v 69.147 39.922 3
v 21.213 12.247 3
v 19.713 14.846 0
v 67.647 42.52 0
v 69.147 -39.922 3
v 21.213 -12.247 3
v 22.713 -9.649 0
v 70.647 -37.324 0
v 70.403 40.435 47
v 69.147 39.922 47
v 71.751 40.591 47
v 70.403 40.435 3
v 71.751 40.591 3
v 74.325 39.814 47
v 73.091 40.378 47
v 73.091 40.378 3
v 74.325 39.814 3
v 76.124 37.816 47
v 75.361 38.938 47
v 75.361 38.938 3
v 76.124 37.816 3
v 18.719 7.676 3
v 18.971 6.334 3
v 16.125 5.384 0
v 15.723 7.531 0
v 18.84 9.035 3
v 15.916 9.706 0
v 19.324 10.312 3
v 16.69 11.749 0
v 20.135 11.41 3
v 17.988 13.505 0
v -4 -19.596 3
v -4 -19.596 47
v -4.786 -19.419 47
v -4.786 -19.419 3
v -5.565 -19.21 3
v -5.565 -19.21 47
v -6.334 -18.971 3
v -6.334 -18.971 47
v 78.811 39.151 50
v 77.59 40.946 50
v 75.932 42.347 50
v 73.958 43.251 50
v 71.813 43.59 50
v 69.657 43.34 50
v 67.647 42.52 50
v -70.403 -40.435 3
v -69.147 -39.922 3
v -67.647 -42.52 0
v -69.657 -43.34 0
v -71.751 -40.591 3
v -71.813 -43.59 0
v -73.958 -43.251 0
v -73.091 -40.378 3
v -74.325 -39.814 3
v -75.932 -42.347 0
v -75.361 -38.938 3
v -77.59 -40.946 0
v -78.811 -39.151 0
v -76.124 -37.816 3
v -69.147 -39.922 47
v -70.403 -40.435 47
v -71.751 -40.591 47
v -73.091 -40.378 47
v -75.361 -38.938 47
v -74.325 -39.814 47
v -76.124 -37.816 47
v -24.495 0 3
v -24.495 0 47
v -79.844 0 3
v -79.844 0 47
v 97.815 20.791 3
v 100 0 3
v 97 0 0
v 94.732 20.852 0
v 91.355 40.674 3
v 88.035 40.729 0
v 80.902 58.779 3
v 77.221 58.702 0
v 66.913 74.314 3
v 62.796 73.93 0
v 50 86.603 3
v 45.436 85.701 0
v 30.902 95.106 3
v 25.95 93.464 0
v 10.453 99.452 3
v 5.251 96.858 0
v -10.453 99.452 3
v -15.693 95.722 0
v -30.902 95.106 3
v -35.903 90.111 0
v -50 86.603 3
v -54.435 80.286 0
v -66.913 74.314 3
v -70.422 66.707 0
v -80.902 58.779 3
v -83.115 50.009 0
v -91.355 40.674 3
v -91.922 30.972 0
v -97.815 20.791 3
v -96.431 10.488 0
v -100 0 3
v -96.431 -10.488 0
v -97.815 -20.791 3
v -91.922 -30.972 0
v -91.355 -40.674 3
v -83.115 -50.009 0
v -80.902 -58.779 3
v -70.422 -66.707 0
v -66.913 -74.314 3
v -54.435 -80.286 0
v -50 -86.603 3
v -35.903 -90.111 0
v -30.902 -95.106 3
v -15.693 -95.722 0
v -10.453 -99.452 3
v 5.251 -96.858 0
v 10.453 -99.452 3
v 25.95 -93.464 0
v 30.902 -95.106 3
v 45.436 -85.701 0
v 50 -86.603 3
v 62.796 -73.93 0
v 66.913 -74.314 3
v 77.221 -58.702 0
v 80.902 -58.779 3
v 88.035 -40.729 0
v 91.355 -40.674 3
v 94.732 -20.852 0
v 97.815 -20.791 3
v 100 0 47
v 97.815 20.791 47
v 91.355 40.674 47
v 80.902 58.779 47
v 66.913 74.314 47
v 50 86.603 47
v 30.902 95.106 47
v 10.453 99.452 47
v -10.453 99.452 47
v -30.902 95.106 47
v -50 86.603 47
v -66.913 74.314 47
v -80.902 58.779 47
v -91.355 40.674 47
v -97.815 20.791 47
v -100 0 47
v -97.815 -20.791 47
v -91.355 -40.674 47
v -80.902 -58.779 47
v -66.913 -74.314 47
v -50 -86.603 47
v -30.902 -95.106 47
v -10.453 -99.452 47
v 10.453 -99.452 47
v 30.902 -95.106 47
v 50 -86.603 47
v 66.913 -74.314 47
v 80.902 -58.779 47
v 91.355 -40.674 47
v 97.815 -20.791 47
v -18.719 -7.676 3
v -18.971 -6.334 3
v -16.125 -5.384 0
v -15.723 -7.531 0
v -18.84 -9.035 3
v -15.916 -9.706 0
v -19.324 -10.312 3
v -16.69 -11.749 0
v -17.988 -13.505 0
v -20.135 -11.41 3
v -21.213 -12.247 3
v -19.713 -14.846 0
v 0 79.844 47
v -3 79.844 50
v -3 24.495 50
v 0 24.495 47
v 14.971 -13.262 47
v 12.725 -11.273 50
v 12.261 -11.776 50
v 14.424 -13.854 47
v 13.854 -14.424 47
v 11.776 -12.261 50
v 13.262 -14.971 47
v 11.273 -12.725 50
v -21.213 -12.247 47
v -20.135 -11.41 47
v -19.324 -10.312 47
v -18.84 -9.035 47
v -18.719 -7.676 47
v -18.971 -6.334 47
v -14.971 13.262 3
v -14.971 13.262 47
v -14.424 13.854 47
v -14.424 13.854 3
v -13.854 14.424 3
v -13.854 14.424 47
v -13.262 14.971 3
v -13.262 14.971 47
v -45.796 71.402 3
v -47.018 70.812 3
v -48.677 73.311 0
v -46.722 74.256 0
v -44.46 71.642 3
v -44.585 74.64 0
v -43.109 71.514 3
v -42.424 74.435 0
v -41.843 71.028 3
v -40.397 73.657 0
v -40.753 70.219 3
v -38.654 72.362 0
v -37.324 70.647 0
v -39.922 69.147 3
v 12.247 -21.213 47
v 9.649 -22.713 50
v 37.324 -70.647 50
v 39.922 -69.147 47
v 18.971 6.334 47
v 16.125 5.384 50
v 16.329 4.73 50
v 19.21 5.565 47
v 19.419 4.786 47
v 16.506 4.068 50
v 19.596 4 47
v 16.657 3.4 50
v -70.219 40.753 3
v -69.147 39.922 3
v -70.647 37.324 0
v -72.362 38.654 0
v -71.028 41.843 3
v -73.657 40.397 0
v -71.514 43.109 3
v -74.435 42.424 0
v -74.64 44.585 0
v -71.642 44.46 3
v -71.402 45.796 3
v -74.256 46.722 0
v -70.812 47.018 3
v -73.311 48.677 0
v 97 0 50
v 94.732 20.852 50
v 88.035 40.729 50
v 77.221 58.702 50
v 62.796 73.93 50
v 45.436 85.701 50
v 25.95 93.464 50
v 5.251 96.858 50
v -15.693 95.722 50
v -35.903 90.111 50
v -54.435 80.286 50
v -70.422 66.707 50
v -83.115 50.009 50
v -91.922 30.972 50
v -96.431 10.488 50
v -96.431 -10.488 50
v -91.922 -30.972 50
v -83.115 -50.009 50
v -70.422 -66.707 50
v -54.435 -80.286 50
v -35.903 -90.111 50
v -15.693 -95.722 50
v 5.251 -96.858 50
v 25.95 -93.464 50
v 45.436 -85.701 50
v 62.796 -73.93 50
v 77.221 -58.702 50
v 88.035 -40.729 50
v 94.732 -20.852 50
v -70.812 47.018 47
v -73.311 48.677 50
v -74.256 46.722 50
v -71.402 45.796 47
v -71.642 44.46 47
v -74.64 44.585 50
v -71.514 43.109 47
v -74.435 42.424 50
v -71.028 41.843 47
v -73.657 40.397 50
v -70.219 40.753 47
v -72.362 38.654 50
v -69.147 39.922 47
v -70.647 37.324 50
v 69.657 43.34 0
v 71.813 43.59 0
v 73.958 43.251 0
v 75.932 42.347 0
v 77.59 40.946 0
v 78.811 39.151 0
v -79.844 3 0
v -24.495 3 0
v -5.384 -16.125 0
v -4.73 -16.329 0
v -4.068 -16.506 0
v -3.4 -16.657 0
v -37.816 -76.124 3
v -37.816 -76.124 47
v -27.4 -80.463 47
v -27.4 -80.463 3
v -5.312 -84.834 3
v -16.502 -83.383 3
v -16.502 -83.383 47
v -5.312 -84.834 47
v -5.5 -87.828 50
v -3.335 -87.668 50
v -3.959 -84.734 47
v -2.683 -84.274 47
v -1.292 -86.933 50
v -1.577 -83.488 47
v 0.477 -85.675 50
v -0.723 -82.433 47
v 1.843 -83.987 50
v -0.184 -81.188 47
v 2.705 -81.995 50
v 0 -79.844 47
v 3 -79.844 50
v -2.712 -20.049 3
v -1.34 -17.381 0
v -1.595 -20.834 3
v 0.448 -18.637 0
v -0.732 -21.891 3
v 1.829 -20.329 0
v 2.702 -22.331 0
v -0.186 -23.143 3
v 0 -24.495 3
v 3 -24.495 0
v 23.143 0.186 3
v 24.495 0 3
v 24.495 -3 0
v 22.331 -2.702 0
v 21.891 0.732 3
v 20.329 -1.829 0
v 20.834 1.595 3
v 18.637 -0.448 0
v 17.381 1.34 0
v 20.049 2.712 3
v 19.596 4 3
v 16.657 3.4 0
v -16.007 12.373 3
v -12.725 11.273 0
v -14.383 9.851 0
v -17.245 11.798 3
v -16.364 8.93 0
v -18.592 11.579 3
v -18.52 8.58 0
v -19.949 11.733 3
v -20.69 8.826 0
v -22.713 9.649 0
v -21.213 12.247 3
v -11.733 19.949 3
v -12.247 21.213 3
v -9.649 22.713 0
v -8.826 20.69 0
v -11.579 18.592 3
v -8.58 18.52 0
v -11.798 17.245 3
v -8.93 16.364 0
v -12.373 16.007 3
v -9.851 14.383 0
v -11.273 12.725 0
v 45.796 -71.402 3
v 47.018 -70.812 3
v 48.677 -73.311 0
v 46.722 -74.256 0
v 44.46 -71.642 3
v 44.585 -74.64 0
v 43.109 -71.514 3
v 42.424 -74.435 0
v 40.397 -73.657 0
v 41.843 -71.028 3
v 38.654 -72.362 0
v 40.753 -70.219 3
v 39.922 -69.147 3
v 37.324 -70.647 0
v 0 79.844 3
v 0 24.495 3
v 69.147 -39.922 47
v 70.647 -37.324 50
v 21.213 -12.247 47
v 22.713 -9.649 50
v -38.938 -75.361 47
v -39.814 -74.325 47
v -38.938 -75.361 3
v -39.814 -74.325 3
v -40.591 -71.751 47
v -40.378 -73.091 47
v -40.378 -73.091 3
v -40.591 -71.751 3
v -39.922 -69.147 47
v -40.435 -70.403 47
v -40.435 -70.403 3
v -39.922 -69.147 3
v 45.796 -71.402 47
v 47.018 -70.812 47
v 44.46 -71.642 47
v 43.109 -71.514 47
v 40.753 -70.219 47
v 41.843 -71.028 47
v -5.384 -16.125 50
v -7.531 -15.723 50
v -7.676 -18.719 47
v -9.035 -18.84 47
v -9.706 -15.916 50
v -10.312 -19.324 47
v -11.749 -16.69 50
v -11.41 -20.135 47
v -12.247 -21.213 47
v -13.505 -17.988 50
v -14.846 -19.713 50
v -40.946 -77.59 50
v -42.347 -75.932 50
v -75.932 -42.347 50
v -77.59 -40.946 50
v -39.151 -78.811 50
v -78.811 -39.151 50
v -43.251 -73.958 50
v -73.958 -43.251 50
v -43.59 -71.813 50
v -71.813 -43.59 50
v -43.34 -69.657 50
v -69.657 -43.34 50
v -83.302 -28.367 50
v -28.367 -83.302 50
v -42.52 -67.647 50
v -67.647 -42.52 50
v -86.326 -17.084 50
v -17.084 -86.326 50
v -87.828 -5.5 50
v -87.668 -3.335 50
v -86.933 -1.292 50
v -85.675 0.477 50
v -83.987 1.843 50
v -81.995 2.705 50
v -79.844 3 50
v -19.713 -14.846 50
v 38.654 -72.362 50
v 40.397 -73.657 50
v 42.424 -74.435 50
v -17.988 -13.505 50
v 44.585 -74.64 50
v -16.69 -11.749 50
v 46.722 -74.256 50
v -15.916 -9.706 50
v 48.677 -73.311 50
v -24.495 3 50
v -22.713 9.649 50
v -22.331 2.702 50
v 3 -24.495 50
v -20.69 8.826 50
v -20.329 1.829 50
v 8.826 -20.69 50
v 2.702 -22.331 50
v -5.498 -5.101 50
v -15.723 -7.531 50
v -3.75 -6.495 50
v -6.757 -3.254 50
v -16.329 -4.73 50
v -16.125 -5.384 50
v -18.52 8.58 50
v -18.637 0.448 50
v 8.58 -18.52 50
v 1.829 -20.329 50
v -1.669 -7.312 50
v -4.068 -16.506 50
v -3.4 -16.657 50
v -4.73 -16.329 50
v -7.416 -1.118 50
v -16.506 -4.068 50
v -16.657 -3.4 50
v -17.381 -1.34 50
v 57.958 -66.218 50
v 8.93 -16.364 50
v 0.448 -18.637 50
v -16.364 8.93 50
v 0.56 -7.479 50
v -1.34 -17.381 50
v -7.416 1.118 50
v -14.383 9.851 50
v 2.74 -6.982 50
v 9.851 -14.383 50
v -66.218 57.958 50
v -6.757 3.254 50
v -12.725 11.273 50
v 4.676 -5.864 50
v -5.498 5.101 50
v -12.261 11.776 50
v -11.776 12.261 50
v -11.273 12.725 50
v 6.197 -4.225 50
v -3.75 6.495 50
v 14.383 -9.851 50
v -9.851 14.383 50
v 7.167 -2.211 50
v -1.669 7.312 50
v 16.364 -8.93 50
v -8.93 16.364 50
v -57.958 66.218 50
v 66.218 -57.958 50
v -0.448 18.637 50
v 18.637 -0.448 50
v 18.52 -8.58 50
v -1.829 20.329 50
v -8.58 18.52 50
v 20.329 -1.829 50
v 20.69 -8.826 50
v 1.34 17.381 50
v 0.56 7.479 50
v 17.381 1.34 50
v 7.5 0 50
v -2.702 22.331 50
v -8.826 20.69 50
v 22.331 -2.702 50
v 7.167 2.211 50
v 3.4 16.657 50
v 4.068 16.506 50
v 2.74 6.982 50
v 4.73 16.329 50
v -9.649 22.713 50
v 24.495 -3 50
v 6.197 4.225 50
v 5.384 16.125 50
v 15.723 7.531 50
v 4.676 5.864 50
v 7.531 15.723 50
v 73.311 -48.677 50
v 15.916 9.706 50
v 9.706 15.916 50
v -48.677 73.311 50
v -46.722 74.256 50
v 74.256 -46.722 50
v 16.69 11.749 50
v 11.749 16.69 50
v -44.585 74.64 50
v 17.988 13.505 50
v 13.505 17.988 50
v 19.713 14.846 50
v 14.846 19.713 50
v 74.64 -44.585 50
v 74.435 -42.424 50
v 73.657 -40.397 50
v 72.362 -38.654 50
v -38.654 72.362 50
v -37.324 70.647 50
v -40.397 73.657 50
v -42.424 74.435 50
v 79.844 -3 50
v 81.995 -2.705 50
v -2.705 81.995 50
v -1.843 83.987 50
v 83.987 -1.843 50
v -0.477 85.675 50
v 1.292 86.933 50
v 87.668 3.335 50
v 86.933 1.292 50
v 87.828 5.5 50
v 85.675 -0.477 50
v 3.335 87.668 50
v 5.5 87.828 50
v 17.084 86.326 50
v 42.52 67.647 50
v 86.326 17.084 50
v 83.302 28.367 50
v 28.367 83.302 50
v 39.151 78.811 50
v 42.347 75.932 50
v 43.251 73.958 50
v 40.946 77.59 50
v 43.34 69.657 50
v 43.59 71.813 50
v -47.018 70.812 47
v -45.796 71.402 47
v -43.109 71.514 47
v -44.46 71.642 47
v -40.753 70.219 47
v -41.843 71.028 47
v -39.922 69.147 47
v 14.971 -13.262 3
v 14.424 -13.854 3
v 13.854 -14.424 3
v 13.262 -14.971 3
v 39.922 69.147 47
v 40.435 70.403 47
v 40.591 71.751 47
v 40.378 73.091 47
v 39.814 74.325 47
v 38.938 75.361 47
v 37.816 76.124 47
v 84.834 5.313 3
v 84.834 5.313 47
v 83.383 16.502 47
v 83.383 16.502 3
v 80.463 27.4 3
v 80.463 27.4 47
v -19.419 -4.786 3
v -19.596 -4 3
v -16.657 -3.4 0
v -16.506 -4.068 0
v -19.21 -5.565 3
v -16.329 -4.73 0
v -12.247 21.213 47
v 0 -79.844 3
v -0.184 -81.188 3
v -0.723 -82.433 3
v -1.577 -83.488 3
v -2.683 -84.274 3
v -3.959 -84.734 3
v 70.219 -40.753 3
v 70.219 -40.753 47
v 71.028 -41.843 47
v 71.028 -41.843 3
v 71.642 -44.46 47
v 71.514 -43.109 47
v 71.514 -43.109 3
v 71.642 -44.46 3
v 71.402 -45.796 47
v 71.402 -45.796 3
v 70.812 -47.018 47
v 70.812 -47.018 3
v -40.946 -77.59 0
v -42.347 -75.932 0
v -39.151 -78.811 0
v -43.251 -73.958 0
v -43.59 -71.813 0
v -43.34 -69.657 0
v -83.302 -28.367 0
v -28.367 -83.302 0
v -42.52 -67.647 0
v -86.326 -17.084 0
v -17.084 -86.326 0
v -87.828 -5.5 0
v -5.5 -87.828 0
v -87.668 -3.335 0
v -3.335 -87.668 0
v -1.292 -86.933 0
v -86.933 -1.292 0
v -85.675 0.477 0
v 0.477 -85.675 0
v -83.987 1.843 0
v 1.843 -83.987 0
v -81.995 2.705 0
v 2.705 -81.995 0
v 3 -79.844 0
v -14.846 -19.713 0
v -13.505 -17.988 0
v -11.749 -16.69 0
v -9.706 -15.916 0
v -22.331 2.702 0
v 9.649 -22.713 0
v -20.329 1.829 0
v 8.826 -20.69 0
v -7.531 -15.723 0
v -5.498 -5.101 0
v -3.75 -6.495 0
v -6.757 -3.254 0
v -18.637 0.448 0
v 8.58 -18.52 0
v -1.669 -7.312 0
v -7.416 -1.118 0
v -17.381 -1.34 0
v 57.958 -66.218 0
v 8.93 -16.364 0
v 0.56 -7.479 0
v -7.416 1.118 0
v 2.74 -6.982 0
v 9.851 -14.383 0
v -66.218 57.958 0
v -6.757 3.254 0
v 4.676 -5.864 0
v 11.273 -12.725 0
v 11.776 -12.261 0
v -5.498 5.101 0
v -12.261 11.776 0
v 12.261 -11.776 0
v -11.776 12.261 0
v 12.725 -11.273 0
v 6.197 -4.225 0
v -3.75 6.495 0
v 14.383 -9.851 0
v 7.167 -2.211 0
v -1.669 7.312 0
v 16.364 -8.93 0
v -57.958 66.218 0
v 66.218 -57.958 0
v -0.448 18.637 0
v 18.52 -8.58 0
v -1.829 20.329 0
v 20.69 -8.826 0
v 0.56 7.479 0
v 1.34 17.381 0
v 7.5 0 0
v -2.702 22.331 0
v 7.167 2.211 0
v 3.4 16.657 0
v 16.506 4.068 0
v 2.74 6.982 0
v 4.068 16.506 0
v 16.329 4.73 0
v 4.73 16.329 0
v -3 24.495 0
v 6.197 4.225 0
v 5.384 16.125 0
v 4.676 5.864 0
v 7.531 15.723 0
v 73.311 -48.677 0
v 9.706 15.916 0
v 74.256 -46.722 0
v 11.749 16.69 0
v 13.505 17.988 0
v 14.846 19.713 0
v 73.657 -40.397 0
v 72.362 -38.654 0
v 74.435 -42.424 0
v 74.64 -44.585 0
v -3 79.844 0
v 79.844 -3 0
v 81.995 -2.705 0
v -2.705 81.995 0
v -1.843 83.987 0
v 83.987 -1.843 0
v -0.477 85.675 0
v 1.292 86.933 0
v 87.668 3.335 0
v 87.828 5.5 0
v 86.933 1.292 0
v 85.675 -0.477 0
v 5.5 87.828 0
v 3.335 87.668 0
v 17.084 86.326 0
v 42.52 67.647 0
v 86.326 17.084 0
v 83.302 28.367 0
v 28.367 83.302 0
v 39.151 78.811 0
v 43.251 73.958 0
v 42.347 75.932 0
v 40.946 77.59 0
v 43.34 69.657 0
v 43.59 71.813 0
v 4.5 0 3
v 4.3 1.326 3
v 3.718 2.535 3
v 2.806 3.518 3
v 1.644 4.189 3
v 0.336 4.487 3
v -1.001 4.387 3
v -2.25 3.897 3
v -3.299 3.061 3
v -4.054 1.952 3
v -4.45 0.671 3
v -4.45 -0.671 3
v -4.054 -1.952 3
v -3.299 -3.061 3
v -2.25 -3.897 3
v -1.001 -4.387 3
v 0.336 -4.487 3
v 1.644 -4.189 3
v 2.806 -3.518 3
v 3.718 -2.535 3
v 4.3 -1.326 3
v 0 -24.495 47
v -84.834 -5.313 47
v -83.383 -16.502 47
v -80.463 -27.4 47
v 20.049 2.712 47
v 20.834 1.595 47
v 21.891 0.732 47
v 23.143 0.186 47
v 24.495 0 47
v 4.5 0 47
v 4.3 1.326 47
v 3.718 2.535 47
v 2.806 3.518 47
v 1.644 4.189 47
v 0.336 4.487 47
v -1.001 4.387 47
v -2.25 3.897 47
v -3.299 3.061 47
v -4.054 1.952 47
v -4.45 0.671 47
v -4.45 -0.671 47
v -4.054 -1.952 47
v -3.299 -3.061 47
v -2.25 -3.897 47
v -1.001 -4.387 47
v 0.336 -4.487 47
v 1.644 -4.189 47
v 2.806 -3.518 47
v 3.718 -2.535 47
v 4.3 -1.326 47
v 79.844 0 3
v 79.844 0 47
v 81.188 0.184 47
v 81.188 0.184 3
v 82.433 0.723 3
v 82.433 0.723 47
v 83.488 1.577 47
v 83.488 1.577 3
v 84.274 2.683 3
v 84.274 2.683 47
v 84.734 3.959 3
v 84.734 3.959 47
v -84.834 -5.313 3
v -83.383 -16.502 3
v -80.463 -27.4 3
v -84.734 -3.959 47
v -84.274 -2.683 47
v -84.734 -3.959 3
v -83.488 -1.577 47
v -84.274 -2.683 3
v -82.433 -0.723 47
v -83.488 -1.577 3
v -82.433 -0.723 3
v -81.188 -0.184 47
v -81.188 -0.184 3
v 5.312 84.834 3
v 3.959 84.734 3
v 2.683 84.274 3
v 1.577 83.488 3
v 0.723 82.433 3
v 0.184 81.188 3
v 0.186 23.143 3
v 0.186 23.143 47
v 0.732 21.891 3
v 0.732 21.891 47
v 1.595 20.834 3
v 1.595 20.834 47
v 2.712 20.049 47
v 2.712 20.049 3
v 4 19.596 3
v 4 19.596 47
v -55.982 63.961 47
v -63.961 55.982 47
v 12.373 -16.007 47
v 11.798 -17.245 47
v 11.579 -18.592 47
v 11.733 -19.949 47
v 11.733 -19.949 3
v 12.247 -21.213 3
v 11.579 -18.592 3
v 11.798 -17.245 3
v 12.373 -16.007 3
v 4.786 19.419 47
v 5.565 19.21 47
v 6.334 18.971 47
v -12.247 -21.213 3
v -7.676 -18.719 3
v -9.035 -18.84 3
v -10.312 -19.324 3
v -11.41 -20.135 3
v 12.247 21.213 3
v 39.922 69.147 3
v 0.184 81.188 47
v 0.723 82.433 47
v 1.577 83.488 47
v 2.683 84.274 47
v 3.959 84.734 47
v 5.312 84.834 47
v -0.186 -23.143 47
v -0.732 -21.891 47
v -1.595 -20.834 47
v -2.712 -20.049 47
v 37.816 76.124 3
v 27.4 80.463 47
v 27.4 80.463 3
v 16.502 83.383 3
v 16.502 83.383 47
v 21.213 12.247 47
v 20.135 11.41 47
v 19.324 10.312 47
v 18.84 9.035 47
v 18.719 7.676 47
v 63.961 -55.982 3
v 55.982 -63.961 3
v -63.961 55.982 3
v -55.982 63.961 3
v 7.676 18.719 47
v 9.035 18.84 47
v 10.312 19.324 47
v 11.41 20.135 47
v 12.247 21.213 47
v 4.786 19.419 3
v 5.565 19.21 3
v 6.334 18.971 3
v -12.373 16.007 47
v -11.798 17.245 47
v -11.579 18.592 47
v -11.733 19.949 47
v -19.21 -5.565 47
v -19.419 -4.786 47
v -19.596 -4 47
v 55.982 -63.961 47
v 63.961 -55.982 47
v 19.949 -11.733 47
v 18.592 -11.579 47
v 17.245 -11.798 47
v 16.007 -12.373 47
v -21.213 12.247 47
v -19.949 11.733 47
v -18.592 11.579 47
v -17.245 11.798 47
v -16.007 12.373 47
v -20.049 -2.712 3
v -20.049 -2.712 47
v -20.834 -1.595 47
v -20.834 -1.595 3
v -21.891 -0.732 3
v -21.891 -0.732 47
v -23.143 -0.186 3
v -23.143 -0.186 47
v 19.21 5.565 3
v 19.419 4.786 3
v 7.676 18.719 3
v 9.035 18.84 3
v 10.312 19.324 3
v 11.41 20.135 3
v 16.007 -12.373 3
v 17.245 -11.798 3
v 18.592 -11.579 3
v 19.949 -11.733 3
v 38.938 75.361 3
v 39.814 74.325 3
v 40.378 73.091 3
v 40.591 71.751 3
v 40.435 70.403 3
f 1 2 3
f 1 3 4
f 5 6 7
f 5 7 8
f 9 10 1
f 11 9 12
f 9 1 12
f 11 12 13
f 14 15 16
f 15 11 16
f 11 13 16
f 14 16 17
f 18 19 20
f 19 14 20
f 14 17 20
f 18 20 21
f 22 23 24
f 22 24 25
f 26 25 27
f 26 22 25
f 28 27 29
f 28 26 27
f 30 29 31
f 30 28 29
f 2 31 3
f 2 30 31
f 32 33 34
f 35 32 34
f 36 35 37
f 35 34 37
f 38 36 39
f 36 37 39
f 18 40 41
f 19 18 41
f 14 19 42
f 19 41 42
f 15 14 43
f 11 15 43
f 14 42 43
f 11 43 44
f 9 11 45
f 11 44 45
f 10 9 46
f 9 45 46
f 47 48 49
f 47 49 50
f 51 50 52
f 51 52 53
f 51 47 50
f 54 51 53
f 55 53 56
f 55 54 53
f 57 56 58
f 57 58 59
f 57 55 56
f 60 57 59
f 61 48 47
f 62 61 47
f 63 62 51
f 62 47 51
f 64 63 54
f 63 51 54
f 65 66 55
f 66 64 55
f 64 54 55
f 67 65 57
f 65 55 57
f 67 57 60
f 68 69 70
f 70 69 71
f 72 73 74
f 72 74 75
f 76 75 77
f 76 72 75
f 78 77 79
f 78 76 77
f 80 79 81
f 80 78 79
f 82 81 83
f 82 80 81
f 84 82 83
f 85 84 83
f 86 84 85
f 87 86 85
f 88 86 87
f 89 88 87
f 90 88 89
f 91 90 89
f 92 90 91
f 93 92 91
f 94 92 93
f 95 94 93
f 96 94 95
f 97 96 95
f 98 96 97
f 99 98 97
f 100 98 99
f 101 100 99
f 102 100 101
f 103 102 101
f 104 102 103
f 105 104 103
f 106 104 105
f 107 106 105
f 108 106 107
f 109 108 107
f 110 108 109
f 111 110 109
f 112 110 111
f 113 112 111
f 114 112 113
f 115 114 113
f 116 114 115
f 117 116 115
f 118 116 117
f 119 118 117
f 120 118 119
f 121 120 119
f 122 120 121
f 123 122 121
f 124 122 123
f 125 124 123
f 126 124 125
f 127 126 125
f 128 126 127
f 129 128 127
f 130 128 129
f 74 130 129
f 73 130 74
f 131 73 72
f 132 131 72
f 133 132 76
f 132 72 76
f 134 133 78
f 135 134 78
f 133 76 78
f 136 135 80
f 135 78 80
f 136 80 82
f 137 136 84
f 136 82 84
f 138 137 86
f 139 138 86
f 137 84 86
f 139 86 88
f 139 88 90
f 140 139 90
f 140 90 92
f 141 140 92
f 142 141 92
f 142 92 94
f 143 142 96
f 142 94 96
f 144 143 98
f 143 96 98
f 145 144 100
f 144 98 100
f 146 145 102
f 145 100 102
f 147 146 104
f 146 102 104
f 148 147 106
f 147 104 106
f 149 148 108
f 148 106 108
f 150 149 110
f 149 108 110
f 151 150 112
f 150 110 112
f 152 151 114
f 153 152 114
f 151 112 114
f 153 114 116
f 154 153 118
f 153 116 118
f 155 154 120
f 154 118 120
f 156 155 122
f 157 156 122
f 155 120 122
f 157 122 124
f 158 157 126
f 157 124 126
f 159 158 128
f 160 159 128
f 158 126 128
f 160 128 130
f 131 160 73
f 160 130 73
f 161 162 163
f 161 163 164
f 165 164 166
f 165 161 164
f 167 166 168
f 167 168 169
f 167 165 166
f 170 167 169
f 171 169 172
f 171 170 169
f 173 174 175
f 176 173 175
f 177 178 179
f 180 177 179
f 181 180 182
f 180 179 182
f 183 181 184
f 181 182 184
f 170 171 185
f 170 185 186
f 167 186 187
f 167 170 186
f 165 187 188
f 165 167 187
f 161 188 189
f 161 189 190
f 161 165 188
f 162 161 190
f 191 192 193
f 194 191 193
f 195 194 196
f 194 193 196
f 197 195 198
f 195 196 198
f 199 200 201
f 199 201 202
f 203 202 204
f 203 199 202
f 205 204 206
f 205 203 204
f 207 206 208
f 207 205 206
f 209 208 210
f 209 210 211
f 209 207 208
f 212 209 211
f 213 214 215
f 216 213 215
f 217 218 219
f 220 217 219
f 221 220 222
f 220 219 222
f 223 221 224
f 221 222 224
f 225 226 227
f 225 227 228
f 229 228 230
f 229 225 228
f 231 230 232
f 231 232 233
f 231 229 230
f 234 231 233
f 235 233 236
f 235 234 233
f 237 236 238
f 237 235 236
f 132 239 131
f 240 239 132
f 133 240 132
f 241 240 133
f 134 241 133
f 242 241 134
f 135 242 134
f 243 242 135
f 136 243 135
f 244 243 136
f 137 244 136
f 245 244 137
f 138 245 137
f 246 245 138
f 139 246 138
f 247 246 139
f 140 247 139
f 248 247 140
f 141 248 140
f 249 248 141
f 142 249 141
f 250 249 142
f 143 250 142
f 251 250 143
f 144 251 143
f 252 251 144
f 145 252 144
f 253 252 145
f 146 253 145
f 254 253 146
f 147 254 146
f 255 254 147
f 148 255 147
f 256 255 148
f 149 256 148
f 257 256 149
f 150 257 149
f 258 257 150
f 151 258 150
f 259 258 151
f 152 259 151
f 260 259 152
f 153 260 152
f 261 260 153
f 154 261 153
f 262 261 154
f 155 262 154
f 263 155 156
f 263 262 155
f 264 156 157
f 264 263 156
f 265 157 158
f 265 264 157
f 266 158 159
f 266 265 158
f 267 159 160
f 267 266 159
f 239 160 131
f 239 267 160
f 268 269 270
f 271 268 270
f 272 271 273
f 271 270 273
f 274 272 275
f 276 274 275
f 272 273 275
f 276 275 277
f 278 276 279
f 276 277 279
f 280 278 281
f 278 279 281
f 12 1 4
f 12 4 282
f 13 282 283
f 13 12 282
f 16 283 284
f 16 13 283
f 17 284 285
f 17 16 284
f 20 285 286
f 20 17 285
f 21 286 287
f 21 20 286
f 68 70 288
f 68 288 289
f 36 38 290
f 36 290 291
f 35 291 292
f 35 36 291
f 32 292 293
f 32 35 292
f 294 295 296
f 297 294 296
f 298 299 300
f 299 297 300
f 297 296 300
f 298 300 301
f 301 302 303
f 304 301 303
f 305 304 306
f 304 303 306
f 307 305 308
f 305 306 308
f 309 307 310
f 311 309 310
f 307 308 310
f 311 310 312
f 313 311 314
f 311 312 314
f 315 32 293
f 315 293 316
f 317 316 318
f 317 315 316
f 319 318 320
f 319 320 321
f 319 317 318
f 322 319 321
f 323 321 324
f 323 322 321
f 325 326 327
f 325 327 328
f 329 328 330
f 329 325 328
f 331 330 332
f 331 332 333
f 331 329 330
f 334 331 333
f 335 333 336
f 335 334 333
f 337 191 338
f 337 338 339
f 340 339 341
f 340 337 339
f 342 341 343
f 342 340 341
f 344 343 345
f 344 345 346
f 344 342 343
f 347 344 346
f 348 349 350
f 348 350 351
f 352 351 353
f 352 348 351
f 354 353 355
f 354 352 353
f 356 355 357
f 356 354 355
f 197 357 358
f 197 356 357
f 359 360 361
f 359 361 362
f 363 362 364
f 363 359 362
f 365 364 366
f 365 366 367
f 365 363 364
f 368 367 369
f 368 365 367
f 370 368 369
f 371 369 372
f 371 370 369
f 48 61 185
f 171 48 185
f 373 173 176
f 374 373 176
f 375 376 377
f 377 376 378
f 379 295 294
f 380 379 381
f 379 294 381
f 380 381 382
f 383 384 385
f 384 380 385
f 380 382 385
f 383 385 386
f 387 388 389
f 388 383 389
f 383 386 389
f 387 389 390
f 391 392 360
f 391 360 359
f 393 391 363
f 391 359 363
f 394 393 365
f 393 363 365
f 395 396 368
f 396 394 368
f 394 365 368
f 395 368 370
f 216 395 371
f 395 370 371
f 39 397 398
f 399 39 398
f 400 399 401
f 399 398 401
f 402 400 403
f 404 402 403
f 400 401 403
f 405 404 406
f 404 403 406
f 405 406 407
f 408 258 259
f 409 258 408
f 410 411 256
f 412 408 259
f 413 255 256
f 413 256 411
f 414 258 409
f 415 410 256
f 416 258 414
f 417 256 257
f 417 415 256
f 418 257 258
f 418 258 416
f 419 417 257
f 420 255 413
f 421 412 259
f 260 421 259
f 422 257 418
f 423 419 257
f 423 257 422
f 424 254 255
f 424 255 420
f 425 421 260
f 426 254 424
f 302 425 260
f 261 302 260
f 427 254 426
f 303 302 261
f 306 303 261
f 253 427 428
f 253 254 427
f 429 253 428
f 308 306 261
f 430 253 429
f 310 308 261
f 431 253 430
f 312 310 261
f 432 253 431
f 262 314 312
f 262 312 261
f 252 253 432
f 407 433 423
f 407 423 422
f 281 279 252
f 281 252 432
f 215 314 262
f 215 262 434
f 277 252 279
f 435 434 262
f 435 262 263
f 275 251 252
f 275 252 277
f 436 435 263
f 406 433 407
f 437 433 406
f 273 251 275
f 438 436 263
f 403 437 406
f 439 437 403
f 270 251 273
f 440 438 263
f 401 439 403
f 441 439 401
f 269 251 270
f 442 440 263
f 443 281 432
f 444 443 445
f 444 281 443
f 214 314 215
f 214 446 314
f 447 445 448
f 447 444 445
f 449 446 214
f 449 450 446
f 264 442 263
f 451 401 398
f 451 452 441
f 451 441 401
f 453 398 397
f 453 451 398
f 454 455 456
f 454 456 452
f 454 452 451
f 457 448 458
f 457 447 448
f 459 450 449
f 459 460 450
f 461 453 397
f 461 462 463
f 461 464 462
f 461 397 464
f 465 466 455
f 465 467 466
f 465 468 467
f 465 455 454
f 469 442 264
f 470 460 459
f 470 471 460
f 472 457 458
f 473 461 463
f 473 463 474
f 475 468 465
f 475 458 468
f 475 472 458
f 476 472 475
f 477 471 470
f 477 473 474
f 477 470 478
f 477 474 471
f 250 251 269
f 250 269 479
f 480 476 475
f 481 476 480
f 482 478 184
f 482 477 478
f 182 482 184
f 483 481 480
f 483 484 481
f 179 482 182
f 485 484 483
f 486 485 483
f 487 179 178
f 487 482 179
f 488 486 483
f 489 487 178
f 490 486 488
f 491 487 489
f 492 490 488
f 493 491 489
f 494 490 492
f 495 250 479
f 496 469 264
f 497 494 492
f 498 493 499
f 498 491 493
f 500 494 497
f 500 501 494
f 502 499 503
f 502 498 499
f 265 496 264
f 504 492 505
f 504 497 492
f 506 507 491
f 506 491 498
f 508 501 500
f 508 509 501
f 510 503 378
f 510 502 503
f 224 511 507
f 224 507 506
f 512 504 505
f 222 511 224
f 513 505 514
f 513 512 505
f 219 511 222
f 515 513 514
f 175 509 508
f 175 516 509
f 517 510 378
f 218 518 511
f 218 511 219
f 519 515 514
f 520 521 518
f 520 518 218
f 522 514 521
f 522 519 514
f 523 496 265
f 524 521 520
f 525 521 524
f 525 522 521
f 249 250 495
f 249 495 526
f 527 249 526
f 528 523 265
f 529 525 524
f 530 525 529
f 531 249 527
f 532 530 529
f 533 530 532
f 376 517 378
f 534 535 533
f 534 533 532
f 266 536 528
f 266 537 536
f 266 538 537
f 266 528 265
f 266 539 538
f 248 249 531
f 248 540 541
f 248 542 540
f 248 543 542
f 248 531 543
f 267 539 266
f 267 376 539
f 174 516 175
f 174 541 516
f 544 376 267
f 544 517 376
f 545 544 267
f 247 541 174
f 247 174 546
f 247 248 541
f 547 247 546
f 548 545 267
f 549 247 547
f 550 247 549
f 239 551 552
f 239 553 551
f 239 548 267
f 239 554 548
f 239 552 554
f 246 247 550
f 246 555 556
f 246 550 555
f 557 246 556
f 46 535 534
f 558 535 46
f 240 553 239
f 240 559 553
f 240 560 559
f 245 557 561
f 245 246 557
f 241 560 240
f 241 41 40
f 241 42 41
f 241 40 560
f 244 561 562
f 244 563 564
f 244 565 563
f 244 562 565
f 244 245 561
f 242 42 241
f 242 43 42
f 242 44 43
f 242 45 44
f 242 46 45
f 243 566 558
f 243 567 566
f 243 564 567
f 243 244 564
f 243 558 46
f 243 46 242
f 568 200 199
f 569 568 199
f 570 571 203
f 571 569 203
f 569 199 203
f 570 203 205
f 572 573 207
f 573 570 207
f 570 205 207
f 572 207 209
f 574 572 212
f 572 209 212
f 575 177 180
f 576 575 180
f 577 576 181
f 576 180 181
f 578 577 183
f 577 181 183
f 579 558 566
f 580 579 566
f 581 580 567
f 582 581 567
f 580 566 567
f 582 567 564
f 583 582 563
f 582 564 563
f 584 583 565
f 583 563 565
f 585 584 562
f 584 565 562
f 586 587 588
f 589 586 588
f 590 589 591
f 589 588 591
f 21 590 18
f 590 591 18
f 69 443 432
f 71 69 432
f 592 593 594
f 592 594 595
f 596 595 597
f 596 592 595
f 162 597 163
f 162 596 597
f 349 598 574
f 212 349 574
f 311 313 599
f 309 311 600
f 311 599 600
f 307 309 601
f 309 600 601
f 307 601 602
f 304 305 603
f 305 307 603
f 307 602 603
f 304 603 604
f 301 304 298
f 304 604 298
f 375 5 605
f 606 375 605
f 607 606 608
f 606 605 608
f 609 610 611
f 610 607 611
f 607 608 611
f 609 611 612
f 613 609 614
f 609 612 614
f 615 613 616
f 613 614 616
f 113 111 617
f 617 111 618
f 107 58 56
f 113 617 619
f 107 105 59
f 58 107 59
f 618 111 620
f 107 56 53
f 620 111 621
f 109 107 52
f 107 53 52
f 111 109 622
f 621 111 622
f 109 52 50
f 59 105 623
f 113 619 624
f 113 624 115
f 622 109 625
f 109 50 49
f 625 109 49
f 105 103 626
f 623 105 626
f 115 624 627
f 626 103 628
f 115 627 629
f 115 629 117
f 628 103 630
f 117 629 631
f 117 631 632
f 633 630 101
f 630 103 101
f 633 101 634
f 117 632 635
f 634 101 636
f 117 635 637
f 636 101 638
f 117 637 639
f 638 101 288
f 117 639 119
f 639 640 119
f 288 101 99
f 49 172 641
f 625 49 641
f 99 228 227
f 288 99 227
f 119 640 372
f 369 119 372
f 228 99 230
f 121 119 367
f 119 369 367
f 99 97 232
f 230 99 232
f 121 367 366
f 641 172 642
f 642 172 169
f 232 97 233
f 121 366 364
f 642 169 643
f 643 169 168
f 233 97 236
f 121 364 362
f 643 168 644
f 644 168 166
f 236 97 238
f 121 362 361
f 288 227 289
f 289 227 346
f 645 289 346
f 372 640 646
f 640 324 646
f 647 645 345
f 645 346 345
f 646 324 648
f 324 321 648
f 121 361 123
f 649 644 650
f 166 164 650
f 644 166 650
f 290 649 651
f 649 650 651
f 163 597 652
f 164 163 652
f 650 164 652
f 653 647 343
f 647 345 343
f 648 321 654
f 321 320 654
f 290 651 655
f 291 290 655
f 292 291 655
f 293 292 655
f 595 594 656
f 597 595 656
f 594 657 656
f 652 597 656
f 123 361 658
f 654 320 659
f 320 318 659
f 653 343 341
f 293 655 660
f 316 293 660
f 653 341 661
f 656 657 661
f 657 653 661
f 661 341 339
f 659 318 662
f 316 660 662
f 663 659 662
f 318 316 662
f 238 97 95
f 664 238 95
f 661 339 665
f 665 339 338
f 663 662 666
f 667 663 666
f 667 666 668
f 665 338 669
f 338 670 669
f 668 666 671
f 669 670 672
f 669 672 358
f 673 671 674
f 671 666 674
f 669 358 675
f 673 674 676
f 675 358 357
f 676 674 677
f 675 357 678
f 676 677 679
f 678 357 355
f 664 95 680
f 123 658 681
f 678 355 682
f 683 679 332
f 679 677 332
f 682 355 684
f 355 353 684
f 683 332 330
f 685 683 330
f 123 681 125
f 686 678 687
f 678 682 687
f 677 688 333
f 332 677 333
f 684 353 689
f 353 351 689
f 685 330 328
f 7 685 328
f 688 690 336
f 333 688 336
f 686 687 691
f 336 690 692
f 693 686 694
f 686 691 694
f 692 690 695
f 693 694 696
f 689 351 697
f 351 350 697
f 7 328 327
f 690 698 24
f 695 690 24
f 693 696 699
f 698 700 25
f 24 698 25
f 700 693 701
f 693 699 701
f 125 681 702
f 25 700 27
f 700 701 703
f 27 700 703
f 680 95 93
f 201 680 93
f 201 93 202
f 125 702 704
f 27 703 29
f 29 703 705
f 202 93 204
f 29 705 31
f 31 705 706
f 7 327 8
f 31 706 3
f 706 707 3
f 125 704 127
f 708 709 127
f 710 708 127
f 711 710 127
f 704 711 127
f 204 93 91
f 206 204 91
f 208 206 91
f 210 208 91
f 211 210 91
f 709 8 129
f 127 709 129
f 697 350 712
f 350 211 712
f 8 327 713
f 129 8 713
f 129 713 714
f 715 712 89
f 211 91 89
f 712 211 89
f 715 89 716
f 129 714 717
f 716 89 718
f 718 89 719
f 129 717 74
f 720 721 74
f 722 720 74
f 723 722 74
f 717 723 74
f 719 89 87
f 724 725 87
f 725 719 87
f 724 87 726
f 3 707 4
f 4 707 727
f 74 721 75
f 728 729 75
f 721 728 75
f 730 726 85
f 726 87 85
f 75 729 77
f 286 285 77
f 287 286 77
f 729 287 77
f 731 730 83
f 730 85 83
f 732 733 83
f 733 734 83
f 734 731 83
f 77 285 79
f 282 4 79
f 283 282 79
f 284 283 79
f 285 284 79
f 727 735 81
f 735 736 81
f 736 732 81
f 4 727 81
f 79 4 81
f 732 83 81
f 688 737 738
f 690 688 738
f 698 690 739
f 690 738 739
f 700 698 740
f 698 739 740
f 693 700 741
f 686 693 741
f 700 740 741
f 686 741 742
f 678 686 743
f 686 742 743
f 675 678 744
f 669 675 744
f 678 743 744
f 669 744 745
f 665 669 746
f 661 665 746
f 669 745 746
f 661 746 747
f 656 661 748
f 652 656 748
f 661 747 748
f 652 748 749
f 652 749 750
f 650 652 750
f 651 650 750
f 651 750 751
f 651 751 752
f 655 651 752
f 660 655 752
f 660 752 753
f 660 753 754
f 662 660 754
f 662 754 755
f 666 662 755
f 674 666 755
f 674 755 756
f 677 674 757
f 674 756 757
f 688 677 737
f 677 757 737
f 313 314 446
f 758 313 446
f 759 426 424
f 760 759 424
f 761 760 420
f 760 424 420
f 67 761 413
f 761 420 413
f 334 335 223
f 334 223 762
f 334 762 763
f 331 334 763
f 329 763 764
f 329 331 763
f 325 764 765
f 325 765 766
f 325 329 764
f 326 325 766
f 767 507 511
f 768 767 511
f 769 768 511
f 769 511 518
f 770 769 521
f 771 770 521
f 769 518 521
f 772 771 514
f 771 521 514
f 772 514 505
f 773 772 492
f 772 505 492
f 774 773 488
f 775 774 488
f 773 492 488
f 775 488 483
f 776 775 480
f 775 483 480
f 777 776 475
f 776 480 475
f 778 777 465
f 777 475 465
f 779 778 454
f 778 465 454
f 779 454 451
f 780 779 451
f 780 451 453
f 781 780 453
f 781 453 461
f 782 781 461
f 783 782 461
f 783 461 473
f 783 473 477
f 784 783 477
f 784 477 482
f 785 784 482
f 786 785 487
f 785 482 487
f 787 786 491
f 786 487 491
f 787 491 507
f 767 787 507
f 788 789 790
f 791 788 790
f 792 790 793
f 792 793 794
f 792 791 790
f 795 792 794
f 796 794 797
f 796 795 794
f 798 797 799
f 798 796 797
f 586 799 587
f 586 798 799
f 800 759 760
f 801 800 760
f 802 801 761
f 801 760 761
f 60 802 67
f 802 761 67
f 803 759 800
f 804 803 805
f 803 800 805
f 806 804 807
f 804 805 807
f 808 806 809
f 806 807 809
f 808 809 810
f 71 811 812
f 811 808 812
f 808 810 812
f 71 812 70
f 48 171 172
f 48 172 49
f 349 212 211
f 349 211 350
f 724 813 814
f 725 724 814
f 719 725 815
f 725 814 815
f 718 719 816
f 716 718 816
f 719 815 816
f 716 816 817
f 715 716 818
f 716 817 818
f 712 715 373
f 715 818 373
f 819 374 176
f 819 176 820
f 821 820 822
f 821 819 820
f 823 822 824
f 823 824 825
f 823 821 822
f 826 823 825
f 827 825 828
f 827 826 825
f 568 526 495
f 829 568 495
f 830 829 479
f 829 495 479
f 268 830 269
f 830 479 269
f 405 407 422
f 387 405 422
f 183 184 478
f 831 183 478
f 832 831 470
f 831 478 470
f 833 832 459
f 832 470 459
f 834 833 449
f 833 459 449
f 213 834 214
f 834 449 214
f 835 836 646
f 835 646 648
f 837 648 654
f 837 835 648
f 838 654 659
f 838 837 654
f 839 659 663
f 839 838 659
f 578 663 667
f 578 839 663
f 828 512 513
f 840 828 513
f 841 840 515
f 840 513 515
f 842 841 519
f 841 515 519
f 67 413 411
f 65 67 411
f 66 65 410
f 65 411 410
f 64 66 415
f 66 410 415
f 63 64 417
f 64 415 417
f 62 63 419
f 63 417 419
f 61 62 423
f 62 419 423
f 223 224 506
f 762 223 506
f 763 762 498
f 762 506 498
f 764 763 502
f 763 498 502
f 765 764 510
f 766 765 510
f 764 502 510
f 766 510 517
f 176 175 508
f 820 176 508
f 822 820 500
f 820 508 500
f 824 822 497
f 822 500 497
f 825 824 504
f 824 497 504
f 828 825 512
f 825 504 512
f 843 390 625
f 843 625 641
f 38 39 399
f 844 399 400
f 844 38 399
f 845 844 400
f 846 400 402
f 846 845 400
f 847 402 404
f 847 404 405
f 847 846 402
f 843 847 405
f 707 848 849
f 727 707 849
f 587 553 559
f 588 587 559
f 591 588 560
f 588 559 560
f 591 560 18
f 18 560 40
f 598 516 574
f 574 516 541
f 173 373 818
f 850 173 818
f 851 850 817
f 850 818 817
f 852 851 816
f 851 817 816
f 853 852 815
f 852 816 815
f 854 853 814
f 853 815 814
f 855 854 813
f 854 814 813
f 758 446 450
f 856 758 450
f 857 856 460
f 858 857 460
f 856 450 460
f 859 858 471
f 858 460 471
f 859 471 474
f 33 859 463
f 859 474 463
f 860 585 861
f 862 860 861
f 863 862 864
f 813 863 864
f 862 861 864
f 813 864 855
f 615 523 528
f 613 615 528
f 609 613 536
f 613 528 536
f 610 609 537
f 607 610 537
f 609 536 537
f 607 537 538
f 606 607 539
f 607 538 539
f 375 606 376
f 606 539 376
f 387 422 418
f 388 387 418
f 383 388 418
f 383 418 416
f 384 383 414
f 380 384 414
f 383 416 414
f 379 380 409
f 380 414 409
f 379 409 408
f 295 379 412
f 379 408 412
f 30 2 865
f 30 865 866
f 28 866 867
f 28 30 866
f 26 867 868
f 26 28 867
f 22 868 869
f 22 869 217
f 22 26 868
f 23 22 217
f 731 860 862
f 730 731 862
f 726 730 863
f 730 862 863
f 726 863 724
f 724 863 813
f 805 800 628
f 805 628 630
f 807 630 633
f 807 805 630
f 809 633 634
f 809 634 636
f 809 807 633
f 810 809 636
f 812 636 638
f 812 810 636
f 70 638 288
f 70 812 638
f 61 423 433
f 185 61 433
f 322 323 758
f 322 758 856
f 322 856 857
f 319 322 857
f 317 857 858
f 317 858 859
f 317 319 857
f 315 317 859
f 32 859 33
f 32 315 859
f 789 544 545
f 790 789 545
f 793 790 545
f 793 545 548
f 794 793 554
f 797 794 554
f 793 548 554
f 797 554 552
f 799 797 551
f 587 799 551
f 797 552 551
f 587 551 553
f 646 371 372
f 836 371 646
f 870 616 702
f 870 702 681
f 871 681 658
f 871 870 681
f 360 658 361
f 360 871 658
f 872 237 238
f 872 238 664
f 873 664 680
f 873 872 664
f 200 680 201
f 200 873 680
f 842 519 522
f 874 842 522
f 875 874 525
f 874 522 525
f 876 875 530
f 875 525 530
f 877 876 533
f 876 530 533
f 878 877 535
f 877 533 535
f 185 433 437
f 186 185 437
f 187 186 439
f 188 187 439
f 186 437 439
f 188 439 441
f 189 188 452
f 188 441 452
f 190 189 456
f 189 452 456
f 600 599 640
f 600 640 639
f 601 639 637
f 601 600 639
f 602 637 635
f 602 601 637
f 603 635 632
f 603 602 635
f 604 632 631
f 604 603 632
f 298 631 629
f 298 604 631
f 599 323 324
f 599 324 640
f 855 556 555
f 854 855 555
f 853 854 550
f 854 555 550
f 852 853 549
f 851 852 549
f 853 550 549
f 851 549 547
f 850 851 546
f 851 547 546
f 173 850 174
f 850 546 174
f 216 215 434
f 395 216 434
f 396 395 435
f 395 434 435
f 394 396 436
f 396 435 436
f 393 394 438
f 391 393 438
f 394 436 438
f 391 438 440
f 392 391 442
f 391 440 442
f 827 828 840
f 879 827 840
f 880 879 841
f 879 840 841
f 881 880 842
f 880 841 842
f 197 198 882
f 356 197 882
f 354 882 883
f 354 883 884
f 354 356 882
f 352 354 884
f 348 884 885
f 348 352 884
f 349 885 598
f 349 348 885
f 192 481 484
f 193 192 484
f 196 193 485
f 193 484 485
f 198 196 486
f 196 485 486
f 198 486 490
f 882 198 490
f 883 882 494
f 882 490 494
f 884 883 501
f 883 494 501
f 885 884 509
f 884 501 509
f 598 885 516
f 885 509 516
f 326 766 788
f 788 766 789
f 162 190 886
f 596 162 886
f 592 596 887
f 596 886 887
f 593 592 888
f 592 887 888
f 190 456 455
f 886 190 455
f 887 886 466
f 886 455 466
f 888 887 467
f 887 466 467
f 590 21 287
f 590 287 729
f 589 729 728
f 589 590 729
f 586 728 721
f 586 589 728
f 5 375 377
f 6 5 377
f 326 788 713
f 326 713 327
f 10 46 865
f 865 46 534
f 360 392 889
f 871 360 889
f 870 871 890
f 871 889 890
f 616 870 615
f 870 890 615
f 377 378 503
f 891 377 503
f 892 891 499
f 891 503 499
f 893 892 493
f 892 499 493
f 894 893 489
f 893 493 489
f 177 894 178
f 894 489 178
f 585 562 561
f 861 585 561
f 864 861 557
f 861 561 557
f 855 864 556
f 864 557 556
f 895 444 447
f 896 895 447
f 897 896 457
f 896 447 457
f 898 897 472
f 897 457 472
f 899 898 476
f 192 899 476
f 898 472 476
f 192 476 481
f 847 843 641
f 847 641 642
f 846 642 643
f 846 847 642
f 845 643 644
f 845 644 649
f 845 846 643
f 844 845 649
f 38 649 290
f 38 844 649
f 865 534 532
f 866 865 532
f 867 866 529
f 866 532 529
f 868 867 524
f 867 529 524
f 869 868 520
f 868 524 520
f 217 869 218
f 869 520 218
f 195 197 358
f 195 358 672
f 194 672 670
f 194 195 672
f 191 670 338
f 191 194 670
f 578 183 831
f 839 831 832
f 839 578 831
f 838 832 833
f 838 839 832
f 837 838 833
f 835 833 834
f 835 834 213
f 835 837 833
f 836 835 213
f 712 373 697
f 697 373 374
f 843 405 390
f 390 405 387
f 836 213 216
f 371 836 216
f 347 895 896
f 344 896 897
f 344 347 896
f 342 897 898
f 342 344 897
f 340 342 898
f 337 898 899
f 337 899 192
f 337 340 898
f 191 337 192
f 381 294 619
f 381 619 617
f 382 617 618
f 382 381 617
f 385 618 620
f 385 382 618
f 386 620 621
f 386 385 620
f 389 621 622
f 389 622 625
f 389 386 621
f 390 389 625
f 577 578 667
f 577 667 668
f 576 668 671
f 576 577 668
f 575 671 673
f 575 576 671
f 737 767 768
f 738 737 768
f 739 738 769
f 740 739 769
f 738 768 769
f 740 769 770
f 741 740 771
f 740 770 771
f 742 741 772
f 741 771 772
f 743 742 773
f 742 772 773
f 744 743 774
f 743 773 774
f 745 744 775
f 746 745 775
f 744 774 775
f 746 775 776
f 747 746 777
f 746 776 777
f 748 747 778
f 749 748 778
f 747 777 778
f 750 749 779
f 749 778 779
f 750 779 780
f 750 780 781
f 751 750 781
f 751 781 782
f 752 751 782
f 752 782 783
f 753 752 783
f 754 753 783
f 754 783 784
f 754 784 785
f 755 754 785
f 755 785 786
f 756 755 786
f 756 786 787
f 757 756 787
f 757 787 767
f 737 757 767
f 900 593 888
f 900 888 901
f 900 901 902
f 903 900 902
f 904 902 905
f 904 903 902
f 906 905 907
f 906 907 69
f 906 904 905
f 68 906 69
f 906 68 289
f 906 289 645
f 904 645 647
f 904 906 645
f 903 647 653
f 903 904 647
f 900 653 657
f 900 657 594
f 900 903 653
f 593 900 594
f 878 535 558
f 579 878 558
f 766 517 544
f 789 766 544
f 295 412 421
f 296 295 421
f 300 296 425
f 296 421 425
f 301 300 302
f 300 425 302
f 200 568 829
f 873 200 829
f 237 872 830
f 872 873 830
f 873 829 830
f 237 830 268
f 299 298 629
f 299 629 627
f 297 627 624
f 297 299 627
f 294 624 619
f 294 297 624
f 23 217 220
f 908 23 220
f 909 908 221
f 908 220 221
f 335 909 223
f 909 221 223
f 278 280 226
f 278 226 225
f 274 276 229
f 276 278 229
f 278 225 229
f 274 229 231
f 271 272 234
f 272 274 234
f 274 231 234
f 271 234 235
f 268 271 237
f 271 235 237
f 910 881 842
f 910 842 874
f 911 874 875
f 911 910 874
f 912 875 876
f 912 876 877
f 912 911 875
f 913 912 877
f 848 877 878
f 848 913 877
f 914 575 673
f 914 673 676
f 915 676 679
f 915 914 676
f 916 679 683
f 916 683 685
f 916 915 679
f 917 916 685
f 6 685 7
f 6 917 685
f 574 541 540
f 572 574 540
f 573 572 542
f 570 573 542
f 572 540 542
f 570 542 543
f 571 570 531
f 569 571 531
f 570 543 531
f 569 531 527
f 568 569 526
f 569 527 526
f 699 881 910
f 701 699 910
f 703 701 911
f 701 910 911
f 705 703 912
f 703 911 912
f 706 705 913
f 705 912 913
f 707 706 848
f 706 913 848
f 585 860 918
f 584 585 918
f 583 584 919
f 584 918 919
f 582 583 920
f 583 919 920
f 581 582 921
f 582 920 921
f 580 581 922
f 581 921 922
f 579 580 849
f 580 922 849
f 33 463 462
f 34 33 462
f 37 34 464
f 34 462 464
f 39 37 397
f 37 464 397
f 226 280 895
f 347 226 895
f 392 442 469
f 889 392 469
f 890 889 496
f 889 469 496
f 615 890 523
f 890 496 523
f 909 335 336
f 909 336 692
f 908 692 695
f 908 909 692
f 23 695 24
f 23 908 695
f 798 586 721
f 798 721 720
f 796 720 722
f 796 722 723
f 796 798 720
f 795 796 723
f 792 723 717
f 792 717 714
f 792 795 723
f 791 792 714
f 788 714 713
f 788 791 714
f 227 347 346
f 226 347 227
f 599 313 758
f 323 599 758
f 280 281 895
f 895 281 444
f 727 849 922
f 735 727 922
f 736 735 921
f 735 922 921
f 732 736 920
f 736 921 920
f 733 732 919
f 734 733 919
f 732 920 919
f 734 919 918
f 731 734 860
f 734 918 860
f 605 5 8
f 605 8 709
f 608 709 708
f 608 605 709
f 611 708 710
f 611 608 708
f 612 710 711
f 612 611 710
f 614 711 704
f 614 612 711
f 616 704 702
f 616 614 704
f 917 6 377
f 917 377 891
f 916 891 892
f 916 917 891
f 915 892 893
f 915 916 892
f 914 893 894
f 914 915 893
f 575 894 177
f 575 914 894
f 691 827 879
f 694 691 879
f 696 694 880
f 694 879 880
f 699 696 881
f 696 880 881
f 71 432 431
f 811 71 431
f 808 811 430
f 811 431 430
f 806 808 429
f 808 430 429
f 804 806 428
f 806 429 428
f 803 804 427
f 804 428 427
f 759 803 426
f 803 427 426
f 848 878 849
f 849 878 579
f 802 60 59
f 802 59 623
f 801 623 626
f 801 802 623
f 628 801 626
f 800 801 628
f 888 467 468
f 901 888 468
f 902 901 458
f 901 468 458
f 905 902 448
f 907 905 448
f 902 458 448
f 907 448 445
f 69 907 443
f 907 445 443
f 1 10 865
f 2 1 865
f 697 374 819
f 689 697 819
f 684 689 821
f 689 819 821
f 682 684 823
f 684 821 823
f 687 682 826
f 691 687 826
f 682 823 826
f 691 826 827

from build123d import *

# Parameters (mm, degrees)
SKETCH1_R           = 100
BOSS_EXTRUDE1_DEPTH = 50
CUT_EXTRUDE1_DEPTH  = 151
CIRPATTERN1_COUNT   = 6
FILLET1_R           = 5
SKETCH3_R           = 4.5
CUT_EXTRUDE2_DEPTH  = 151
CHAMFER1_SIZE       = 3


with BuildPart() as part:
    # Sketch1 → Boss-Extrude1 (new body)
    with BuildSketch(Plane.XY):
        Circle(SKETCH1_R)
    extrude(amount=BOSS_EXTRUDE1_DEPTH)

    # Sketch2 → Cut-Extrude1 (cut, through all)
    with BuildSketch(Plane.XY.offset(50)):
        with BuildLine():
            Line((0, 85), (0, 20))
            ThreePointArc((0, 20), (5.176380902, 19.318516526), (10, 17.320508076))
            Line((10, 17.320508076), (42.5, 73.612159322))
            ThreePointArc((42.5, 73.612159322), (21.999618834, 82.103695235), (0, 85))
        make_face()
    cut_extrude1 = extrude(amount=-CUT_EXTRUDE1_DEPTH, mode=Mode.SUBTRACT)

    # CirPattern1: Cut-Extrude1 ×6 about axis
    cirpattern1_axis = Axis((0, 0, 0), (0, 0, 1))
    for i in range(1, CIRPATTERN1_COUNT):
        add(cut_extrude1.rotate(cirpattern1_axis, i * 360 / CIRPATTERN1_COUNT), mode=Mode.SUBTRACT)

    # Fillet1
    fillet1_edges = [part.edges().sort_by_distance(p)[0] for p in [
        (42.5, 73.612159322, 25),
        (10, 17.320508076, 25),
        (0, 20, 25),
        (0, 85, 25),
        (85, 0, 25),
        (20, 0, 25),
        (17.320508076, 10, 25),
        (73.612159322, 42.5, 25),
        (42.5, -73.612159322, 25),
        (10, -17.320508076, 25),
        (17.320508076, -10, 25),
        (73.612159322, -42.5, 25),
        (-85, 0, 25),
        (-20, 0, 25),
        (-17.320508076, -10, 25),
        (-73.612159322, -42.5, 25),
        (-42.5, -73.612159322, 25),
        (-10, -17.320508076, 25),
        (0, -20, 25),
        (0, -85, 25),
        (-42.5, 73.612159322, 25),
        (-10, 17.320508076, 25),
        (-17.320508076, 10, 25),
        (-73.612159322, 42.5, 25),
    ]]
    fillet(fillet1_edges, radius=FILLET1_R)

    # Sketch3 → Cut-Extrude2 (cut, through all)
    with BuildSketch(Plane.XY.offset(50)):
        Circle(SKETCH3_R)
    extrude(amount=-CUT_EXTRUDE2_DEPTH, mode=Mode.SUBTRACT)

    # Chamfer1
    chamfer1_edges = [part.edges().sort_by_distance(p)[0] for p in [
        (21.999618834, 82.103695235, 50),
        (21.999618834, 82.103695235, 0),
        (26.084623635, 45.179893433, 50),
        (26.084623635, 45.179893433, 0),
        (5.176380902, 19.318516526, 50),
        (5.176380902, 19.318516526, 0),
        (-14.142135624, 14.142135624, 50),
        (-14.142135624, 14.142135624, 0),
        (-45.179893433, 26.084623635, 50),
        (-45.179893433, 26.084623635, 0),
        (-60.104076401, 60.104076401, 50),
        (-60.104076401, 60.104076401, 0),
        (-26.084623635, 45.179893433, 50),
        (-26.084623635, 45.179893433, 0),
        (-5.176380902, -19.318516526, 50),
        (-5.176380902, -19.318516526, 0),
        (0, -52.169247271, 50),
        (0, -52.169247271, 0),
        (-21.999618834, -82.103695235, 50),
        (-21.999618834, -82.103695235, 0),
        (-26.084623635, -45.179893433, 50),
        (-26.084623635, -45.179893433, 0),
        (-19.318516526, -5.176380902, 50),
        (-19.318516526, -5.176380902, 0),
        (-45.179893433, -26.084623635, 50),
        (-45.179893433, -26.084623635, 0),
        (-82.103695235, -21.999618834, 50),
        (-82.103695235, -21.999618834, 0),
        (-52.169247271, 0, 50),
        (-52.169247271, 0, 0),
        (14.142135624, -14.142135624, 50),
        (14.142135624, -14.142135624, 0),
        (45.179893433, -26.084623635, 50),
        (45.179893433, -26.084623635, 0),
        (60.104076401, -60.104076401, 50),
        (60.104076401, -60.104076401, 0),
        (26.084623635, -45.179893433, 50),
        (26.084623635, -45.179893433, 0),
        (19.318516526, 5.176380902, 50),
        (19.318516526, 5.176380902, 0),
        (45.179893433, 26.084623635, 50),
        (45.179893433, 26.084623635, 0),
        (82.103695235, 21.999618834, 50),
        (82.103695235, 21.999618834, 0),
        (52.169247271, 0, 50),
        (52.169247271, 0, 0),
        (1.576734016, 83.487942048, 50),
        (1.576734016, 83.487942048, 0),
        (40.378479311, 73.091045731, 50),
        (40.378479311, 73.091045731, 0),
        (9.690284831, 19.038098975, 50),
        (9.690284831, 19.038098975, 0),
        (-17.911082321, 11.642334937, 50),
        (-17.911082321, 11.642334937, 0),
        (-71.514311715, 43.109462736, 50),
        (-71.514311715, 43.109462736, 0),
        (-43.109462736, 71.514311715, 50),
        (-43.109462736, 71.514311715, 0),
        (-11.642334937, 17.911082321, 50),
        (-11.642334937, 17.911082321, 0),
        (-1.127016654, -21.332619768, 50),
        (-1.127016654, -21.332619768, 0),
        (-1.576734016, -83.487942048, 50),
        (-1.576734016, -83.487942048, 0),
        (-40.378479311, -73.091045731, 50),
        (-40.378479311, -73.091045731, 0),
        (-9.690284831, -19.038098975, 50),
        (-9.690284831, -19.038098975, 0),
        (-19.038098975, -9.690284831, 50),
        (-19.038098975, -9.690284831, 0),
        (-73.091045731, -40.378479311, 50),
        (-73.091045731, -40.378479311, 0),
        (-83.487942048, -1.576734016, 50),
        (-83.487942048, -1.576734016, 0),
        (-21.332619768, -1.127016654, 50),
        (-21.332619768, -1.127016654, 0),
        (17.911082321, -11.642334937, 50),
        (17.911082321, -11.642334937, 0),
        (71.514311715, -43.109462736, 50),
        (71.514311715, -43.109462736, 0),
        (43.109462736, -71.514311715, 50),
        (43.109462736, -71.514311715, 0),
        (11.642334937, -17.911082321, 50),
        (11.642334937, -17.911082321, 0),
        (19.038098975, 9.690284831, 50),
        (19.038098975, 9.690284831, 0),
        (73.091045731, 40.378479311, 50),
        (73.091045731, 40.378479311, 0),
        (83.487942048, 1.576734016, 50),
        (83.487942048, 1.576734016, 0),
        (21.332619768, 1.127016654, 50),
        (21.332619768, 1.127016654, 0),
        (1.127016654, 21.332619768, 50),
        (1.127016654, 21.332619768, 0),
        (-100, 0, 0),
        (-4.5, 0, 0),
        (-4.5, 0, 50),
        (-100, 0, 50),
        (0, 52.169247271, 50),
        (0, 52.169247271, 0),
    ]]
    chamfer(chamfer1_edges, length=CHAMFER1_SIZE)


solid = part.part
